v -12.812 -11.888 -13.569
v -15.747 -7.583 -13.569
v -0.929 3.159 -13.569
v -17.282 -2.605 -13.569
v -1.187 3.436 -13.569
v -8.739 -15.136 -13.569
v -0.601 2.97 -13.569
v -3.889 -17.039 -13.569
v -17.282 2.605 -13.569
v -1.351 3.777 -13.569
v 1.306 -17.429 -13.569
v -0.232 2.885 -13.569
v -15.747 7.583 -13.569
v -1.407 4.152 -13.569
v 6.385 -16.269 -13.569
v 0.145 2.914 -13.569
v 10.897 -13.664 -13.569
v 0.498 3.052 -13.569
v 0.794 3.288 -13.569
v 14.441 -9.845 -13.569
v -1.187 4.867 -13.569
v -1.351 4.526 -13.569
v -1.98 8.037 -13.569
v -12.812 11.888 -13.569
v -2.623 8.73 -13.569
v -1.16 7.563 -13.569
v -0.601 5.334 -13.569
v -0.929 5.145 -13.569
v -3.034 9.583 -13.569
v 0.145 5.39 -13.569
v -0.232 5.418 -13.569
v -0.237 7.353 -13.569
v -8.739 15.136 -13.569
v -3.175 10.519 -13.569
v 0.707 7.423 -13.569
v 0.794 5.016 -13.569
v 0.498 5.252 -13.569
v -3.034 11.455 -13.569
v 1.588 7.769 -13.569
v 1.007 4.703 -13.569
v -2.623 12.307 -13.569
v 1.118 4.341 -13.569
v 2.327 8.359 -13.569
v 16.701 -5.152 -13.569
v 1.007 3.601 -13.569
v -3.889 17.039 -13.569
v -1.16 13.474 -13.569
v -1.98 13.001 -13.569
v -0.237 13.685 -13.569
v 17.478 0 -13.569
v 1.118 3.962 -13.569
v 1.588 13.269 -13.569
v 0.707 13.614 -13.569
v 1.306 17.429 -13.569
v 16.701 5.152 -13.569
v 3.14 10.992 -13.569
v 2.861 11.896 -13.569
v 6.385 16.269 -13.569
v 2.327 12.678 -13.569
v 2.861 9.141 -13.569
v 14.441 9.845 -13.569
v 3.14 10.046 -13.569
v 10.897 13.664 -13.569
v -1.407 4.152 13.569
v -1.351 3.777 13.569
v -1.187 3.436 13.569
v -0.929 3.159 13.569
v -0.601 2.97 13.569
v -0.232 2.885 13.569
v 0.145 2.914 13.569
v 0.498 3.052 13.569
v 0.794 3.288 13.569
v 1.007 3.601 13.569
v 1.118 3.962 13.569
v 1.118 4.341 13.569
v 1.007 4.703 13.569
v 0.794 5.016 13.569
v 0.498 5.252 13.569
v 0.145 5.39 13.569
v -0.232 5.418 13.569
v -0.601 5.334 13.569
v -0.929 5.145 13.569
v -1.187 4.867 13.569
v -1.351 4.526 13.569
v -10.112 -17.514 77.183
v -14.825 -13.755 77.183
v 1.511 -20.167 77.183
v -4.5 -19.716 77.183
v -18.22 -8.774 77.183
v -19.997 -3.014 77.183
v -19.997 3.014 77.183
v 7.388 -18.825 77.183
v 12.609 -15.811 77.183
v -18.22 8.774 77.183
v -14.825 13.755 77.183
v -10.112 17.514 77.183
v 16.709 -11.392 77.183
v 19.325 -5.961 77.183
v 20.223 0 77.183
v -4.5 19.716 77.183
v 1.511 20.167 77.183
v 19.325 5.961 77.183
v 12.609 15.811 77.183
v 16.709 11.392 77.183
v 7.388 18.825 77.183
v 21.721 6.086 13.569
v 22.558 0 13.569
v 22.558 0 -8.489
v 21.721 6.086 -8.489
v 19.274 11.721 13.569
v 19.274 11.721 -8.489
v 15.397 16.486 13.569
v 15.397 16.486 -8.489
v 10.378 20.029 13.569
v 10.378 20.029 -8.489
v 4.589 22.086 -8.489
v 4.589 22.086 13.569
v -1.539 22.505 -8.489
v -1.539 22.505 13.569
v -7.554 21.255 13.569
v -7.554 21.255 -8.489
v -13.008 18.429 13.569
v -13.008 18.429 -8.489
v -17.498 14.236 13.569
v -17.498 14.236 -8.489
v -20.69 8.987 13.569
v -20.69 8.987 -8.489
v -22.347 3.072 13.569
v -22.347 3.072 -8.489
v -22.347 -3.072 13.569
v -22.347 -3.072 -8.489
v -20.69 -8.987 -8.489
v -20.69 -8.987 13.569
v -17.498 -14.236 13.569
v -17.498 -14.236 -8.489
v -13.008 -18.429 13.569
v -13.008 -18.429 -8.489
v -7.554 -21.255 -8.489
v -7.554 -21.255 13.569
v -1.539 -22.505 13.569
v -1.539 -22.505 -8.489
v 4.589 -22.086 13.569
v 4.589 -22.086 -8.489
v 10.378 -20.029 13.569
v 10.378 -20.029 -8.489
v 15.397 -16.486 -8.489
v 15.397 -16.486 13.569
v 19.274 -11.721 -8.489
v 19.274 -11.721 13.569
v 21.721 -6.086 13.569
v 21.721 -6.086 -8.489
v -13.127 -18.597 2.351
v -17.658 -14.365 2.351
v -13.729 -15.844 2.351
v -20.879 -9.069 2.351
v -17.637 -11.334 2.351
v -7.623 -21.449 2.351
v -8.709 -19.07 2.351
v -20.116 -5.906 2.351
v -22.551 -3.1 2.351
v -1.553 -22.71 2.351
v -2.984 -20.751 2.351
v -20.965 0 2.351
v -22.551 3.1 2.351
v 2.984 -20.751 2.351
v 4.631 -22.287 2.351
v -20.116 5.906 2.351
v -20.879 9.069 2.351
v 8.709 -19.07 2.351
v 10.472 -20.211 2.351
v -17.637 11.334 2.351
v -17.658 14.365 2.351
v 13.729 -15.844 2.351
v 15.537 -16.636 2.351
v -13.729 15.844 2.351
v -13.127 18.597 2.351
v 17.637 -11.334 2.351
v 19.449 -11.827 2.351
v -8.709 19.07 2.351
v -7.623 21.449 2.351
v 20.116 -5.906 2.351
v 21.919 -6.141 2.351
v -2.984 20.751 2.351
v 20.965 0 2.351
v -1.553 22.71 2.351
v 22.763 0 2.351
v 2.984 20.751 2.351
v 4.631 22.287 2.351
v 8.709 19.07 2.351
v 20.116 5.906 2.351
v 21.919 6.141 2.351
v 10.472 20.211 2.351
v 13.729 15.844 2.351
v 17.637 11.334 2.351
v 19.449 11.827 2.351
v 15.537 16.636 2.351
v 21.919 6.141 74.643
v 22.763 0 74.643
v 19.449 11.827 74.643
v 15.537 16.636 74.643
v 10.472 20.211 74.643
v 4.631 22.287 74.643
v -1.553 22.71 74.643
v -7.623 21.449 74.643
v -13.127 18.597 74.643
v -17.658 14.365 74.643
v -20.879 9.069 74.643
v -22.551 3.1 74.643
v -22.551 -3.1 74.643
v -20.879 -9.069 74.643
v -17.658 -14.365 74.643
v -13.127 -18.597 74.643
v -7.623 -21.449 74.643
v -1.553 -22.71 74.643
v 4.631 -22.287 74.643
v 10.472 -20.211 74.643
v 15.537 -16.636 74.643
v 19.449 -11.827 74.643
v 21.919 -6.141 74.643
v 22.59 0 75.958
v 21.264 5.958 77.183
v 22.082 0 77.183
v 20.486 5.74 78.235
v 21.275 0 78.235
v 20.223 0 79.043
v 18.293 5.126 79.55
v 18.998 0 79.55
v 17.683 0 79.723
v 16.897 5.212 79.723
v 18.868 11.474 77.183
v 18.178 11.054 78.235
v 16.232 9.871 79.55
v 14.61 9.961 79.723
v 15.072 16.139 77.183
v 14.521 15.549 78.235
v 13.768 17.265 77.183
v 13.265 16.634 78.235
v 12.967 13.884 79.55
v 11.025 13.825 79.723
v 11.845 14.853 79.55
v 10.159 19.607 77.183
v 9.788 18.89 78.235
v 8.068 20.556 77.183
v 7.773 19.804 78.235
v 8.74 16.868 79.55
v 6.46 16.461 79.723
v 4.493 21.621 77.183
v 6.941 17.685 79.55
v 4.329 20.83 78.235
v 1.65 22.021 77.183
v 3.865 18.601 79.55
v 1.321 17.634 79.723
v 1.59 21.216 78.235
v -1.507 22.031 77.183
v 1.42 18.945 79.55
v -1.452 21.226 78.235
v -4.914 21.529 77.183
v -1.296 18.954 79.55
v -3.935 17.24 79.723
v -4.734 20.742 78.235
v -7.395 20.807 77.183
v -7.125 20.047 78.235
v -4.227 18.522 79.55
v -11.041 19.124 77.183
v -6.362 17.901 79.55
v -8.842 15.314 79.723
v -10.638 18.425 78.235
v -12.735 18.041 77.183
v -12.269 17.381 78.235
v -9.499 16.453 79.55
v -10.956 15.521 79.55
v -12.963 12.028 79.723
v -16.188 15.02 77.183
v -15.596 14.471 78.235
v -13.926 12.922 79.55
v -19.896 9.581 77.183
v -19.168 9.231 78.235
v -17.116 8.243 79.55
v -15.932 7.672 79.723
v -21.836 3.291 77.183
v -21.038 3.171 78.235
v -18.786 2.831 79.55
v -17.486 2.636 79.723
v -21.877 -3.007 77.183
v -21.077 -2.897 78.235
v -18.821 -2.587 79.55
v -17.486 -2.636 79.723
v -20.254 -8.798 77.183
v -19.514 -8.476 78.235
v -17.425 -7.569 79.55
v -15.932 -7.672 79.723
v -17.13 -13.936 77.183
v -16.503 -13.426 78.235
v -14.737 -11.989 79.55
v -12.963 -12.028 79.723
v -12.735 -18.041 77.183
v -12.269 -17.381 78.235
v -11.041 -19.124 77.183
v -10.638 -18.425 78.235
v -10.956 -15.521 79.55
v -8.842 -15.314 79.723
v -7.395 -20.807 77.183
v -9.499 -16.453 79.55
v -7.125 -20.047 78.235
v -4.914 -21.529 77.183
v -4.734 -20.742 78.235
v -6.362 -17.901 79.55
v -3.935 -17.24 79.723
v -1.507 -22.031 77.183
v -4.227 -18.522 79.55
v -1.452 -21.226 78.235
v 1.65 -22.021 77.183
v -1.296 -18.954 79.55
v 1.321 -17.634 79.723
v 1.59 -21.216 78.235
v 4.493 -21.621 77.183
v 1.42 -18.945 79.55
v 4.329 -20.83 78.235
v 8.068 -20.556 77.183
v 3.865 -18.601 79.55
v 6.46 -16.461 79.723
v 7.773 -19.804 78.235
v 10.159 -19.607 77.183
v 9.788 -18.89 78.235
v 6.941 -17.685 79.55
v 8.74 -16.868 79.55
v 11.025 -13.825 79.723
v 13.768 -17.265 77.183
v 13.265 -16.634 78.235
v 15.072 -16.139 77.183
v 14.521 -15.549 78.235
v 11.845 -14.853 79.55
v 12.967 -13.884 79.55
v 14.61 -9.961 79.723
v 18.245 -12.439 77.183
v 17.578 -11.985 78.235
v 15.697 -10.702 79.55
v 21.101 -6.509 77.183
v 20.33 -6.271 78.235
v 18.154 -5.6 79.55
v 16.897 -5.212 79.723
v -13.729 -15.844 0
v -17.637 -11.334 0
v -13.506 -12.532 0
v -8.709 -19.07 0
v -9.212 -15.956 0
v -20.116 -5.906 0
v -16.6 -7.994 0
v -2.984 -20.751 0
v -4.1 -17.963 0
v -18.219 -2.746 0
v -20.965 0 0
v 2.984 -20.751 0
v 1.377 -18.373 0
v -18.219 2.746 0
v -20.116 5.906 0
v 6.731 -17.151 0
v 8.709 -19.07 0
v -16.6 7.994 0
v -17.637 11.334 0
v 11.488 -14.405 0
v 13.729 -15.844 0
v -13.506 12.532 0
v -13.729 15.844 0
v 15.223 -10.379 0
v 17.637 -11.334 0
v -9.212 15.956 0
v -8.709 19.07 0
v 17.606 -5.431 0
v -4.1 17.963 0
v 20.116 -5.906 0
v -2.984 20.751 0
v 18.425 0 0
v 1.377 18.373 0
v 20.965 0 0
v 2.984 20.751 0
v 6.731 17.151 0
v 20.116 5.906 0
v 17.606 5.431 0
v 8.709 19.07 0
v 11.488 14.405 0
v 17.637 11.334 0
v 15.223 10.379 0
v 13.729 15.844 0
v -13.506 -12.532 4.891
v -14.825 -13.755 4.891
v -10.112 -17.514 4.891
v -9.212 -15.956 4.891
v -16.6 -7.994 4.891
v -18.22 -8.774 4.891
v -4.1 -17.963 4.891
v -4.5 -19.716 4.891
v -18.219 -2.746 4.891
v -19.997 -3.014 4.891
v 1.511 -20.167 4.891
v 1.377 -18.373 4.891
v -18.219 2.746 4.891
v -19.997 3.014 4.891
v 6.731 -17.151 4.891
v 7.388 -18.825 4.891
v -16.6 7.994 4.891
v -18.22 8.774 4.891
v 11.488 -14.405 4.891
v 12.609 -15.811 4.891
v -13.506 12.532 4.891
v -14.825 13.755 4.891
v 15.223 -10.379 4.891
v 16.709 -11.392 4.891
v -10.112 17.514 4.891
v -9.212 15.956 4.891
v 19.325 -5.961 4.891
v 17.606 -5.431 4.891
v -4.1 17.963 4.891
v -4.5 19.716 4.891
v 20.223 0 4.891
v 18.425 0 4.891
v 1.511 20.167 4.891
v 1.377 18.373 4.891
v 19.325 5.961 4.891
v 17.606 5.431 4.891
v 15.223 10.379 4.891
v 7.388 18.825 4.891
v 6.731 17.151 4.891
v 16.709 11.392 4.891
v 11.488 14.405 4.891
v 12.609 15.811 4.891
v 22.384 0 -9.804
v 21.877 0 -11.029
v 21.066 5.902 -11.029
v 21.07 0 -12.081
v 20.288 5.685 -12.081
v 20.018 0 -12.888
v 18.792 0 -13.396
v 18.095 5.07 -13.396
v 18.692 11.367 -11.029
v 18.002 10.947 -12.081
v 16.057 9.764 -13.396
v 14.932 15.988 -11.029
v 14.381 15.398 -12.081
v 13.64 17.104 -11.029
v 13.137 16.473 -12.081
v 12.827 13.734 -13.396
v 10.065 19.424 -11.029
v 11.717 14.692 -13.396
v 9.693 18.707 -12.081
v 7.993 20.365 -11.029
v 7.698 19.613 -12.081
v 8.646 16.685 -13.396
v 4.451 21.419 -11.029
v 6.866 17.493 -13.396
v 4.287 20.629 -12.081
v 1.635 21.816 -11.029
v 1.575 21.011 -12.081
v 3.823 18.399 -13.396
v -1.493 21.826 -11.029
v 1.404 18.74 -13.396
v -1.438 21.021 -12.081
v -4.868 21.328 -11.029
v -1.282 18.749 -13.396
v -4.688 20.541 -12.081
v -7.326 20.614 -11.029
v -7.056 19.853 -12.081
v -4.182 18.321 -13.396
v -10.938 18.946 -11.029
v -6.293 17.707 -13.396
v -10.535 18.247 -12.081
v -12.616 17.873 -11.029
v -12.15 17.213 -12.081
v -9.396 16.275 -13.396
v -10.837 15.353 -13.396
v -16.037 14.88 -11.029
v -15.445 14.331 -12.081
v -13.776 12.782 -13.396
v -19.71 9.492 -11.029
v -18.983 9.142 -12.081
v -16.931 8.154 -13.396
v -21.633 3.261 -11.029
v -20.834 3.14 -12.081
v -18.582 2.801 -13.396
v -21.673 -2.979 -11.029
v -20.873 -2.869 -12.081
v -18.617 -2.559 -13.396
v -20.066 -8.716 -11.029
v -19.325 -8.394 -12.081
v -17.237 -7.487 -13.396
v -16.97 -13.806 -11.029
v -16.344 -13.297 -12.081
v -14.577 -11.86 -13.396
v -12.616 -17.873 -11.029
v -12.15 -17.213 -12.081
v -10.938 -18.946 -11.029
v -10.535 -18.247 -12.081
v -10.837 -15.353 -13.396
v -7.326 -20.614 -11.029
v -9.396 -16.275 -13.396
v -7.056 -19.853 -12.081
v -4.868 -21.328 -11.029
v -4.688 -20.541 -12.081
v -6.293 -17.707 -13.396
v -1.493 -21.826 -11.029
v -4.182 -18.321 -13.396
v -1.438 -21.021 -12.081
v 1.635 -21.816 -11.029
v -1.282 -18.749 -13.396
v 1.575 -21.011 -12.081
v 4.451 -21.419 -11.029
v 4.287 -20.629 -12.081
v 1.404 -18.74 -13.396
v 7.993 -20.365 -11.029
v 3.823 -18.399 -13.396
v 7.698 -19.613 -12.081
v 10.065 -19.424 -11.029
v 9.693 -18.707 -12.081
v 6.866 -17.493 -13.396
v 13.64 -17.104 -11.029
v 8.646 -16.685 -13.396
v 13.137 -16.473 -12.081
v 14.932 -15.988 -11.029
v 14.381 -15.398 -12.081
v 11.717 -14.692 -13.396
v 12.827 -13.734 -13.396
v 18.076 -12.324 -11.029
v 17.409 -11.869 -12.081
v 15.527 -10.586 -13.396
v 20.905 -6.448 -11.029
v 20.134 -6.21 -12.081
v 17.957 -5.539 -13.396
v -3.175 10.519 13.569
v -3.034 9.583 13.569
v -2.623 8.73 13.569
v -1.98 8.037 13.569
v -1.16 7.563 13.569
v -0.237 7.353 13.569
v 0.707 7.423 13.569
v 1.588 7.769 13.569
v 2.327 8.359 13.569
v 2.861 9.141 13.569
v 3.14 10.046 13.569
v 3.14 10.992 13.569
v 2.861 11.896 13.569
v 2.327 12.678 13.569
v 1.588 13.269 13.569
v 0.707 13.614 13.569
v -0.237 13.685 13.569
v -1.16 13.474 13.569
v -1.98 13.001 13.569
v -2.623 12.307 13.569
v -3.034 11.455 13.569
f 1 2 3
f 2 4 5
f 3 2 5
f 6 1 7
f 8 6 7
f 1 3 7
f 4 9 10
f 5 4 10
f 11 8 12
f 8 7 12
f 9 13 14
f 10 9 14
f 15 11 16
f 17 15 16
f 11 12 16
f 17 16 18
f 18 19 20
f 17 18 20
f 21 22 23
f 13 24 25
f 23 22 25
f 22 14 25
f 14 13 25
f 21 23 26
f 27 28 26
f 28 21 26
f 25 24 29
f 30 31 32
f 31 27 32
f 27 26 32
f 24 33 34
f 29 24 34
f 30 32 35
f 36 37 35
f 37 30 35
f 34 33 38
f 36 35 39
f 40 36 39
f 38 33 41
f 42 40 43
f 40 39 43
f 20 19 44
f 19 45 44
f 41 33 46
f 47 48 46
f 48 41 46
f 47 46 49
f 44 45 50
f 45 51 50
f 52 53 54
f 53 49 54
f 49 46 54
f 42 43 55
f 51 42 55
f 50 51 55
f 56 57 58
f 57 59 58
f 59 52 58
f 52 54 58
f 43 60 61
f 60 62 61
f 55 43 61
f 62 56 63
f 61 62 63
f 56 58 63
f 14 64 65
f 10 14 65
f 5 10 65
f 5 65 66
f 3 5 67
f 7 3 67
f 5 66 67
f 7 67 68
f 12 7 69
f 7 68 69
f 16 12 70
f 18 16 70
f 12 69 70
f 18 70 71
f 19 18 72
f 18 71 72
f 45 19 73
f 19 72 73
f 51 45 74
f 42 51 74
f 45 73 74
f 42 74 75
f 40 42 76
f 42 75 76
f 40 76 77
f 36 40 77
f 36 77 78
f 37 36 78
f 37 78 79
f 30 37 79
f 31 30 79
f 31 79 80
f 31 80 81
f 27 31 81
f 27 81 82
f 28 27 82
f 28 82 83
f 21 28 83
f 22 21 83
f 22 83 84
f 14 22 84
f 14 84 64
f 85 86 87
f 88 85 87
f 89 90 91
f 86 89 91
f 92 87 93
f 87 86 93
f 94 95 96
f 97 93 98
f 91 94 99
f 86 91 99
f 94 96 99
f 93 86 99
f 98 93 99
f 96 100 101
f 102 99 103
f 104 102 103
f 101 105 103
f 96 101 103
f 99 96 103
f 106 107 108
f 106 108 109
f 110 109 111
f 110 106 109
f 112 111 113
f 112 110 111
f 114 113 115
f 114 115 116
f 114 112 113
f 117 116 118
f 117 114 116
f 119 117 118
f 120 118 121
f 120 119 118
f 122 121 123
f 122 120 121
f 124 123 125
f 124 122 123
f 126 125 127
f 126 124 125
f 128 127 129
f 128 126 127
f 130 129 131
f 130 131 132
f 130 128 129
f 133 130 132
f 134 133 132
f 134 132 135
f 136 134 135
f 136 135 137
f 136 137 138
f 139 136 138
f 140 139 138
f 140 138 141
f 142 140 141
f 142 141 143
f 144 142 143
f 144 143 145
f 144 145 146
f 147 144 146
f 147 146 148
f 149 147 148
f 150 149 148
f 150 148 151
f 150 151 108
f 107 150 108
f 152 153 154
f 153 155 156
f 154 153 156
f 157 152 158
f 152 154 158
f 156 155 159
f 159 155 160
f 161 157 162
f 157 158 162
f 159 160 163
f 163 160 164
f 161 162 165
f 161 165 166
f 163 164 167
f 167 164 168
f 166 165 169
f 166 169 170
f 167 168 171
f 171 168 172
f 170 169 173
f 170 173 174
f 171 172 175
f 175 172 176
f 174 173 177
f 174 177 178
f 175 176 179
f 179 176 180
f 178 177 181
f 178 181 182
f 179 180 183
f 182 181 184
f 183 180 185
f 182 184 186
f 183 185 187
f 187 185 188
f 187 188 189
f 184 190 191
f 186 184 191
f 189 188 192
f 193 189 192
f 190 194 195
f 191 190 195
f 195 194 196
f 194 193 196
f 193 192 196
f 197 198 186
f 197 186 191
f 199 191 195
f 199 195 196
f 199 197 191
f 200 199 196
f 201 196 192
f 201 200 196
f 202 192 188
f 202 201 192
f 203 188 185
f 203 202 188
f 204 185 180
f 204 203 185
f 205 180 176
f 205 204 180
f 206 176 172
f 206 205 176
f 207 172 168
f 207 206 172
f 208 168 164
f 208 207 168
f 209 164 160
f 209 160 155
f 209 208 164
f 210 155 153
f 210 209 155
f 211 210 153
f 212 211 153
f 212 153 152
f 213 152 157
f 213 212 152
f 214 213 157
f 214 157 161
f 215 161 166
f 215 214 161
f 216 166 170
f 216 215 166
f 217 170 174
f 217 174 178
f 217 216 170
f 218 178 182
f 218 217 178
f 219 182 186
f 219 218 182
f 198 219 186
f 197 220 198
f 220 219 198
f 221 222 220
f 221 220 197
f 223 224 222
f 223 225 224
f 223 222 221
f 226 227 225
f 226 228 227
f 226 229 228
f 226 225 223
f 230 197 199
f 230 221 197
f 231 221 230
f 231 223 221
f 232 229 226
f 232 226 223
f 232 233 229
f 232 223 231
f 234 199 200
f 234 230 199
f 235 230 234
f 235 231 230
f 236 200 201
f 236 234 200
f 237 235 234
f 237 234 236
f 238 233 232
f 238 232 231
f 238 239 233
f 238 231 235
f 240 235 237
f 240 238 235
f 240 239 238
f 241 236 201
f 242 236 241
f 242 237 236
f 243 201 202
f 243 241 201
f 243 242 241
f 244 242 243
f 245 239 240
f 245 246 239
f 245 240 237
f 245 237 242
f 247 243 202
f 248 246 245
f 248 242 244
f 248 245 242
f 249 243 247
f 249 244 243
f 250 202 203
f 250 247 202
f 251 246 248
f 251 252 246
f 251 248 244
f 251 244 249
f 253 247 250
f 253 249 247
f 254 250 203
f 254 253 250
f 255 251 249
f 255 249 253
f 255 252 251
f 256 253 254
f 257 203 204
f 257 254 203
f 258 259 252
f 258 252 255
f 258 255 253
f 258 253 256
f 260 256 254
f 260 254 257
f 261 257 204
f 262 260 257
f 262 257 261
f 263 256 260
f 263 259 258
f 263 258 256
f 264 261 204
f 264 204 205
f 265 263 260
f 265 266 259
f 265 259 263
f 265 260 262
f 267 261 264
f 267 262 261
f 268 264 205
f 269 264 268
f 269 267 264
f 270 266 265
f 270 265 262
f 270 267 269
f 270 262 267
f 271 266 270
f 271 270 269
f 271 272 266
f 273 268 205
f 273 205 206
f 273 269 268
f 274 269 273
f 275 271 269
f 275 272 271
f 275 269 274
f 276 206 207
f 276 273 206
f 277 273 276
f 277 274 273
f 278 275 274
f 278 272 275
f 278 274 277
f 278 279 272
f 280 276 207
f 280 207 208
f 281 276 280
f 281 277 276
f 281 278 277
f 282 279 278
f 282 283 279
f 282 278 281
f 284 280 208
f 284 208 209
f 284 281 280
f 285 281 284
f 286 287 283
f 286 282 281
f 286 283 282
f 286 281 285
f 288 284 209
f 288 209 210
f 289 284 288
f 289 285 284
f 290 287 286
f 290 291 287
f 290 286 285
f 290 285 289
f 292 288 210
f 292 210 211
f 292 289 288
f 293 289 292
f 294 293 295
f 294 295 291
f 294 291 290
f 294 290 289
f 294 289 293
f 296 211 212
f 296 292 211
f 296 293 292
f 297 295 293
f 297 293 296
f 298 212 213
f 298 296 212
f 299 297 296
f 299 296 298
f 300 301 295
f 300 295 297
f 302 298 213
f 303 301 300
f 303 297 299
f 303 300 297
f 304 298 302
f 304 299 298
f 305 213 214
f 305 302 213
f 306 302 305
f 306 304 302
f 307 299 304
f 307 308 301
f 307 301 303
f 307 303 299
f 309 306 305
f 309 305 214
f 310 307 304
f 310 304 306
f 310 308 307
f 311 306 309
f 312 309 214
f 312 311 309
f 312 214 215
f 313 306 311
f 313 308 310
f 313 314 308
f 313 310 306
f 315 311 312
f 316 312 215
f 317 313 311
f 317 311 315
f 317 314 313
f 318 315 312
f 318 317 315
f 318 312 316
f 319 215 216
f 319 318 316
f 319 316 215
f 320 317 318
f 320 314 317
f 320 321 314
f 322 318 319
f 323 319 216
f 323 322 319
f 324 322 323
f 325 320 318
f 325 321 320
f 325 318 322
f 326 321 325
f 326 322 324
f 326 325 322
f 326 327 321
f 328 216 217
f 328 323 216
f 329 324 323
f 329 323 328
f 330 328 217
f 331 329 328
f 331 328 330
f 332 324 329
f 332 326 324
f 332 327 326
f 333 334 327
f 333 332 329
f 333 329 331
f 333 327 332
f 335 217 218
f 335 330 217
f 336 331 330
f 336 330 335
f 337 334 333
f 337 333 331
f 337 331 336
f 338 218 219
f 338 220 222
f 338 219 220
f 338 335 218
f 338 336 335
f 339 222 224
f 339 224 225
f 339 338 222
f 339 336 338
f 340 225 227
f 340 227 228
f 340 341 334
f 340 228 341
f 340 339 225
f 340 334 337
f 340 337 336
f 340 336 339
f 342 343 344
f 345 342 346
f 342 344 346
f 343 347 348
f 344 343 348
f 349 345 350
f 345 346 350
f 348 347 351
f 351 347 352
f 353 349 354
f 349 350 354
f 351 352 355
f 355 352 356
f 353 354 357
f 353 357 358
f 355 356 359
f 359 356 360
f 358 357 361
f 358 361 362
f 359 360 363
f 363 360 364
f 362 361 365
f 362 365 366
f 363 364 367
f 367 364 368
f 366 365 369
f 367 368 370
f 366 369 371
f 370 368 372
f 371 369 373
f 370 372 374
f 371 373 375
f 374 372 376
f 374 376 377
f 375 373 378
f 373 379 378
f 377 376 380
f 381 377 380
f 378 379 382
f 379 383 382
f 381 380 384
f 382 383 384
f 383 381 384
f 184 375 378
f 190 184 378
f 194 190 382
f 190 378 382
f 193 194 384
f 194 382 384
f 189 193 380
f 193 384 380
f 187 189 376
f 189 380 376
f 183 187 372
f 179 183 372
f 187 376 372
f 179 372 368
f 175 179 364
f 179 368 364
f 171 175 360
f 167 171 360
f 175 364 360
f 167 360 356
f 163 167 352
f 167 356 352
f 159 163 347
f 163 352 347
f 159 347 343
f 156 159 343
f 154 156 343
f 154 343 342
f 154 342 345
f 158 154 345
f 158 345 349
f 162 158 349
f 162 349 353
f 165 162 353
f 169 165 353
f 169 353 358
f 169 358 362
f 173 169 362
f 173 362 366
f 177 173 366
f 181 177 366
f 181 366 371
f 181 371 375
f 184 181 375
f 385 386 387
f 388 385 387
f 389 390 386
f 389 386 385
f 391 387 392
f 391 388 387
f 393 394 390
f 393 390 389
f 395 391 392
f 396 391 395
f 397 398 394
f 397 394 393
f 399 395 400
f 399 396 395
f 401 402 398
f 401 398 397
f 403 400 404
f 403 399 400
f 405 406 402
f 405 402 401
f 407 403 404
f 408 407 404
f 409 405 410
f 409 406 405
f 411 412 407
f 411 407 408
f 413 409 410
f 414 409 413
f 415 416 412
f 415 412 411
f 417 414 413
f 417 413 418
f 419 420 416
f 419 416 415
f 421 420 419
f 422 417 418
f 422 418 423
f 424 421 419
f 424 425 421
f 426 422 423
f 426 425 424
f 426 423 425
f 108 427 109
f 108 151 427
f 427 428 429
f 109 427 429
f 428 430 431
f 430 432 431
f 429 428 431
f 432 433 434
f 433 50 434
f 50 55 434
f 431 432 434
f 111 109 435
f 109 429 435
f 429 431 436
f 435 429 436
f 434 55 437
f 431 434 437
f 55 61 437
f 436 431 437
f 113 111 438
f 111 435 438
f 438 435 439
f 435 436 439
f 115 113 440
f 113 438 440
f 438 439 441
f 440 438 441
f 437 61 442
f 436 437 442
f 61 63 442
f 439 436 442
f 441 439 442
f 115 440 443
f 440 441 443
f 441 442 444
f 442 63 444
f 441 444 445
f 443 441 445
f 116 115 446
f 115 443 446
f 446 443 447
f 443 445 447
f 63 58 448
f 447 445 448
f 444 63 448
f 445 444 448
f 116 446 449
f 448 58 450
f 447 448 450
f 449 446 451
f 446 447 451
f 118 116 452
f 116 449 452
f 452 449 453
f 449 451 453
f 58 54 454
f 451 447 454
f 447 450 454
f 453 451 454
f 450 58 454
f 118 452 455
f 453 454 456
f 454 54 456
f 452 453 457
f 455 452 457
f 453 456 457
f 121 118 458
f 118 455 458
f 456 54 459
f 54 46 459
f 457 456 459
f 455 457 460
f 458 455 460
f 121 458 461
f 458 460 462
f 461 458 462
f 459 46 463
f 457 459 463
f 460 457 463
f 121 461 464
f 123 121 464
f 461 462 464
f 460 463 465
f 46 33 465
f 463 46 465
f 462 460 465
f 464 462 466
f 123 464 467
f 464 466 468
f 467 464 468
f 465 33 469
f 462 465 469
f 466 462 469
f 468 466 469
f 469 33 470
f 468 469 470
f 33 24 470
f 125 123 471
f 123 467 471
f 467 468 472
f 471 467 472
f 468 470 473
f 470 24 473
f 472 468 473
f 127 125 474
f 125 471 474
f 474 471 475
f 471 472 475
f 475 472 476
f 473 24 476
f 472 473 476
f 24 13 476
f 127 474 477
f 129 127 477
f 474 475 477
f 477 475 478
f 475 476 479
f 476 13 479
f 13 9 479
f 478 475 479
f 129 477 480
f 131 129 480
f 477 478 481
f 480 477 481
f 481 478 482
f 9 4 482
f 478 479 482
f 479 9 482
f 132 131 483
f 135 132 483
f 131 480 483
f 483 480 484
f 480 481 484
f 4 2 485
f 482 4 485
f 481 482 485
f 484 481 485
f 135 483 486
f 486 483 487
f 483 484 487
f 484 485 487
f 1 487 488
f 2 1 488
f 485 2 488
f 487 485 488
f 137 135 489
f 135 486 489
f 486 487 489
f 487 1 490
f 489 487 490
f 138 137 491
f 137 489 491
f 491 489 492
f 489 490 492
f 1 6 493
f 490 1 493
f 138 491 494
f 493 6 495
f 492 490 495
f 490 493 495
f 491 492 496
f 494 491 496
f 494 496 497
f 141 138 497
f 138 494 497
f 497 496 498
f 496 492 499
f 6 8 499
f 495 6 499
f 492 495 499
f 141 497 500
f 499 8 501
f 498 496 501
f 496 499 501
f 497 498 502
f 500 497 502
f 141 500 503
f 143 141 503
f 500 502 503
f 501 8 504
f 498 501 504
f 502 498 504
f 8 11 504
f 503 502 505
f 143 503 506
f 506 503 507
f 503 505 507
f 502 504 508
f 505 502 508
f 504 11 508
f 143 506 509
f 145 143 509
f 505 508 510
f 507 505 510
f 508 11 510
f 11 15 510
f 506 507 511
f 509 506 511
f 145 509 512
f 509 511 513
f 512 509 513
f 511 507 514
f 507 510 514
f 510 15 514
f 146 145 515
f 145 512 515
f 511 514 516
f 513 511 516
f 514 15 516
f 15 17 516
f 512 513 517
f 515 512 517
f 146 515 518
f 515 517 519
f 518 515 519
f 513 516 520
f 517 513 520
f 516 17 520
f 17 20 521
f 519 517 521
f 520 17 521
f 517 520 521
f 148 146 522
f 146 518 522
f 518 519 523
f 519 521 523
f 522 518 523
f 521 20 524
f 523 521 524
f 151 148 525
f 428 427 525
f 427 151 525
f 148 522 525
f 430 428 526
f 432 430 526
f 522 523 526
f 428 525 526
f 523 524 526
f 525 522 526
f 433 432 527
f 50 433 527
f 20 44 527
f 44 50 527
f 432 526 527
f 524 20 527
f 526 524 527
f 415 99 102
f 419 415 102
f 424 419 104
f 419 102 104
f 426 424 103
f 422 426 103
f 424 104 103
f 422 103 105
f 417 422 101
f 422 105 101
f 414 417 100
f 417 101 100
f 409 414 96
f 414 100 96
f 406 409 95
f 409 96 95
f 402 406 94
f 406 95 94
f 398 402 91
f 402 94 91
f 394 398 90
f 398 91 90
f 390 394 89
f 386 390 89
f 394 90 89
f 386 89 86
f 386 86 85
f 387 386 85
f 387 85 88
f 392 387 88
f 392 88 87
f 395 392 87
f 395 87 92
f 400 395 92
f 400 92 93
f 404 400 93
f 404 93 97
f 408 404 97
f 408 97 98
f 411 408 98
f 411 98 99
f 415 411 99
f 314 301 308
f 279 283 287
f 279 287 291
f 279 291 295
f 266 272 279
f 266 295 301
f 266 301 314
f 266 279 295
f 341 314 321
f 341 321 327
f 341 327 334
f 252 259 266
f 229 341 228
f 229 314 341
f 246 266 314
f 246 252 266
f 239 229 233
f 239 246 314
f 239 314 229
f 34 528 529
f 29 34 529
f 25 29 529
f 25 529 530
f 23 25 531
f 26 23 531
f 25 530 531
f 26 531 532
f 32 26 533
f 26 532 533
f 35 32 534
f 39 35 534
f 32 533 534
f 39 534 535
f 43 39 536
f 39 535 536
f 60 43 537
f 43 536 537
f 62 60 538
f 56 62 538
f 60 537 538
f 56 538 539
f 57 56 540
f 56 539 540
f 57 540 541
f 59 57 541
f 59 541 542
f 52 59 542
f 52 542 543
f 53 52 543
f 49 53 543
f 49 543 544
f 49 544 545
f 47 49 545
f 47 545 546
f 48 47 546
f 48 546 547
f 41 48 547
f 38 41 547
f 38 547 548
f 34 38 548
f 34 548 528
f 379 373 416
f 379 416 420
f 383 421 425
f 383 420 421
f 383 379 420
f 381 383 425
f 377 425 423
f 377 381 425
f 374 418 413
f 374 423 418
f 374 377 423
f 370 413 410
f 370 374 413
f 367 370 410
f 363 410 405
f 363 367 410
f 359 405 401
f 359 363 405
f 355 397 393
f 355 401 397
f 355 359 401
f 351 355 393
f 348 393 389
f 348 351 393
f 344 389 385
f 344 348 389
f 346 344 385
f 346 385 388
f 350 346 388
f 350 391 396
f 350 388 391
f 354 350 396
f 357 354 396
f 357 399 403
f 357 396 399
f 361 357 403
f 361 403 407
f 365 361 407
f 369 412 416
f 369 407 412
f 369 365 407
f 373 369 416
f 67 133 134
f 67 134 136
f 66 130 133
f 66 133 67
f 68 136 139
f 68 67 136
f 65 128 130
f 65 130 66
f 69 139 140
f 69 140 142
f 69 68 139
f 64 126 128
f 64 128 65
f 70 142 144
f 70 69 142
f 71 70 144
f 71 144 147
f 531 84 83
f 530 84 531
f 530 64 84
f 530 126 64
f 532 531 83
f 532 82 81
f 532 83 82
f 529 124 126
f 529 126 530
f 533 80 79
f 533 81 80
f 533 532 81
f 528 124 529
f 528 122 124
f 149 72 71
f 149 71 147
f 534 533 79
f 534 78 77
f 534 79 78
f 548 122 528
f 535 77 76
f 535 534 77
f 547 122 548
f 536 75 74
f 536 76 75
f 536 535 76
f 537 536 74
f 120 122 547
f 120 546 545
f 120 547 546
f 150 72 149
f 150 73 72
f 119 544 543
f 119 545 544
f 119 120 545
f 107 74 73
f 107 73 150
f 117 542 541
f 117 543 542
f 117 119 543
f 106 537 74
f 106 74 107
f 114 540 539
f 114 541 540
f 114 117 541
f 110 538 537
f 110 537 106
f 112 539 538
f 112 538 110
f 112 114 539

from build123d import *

# Parameters (mm, degrees)
F0_R      = 20.9647391965
F1_DEPTH  = 79.7232091427
F2_R      = 22.7630616111
F2_R_2    = 20.9647391965
F3_DEPTH  = 77.3724243045
F4_T      = -2.54
F5_R      = 5.08
F6_R      = 22.5575417357
F7_DEPTH  = 13.5688632727
F9_D      = 6.35
F9_DEPTH  = 31.75
F9_TIP    = 1.9077324654
F10_R     = 5.08
F12_D     = 2.54
F12_DEPTH = 31.75
F12_TIP   = 0.7630929862


with BuildPart() as f1:
    # F0 (on Top) → F1 (new body)
    with BuildSketch(Plane.XY):
        Circle(F0_R)
    extrude(amount=F1_DEPTH)

    # F2 (on face) → F3 (join)
    with BuildSketch(Plane.XY.offset(79.7232091427)):
        Circle(F2_R)
        Circle(F2_R_2, mode=Mode.SUBTRACT)
    extrude(amount=-F3_DEPTH)

    # F4
    f4_openings = [f1.faces().sort_by_distance(p)[0] for p in [
        (0, 0, 0),
    ]]
    offset(amount=F4_T, openings=f4_openings, kind=Kind.INTERSECTION)

    # F5
    f5_edges = [f1.edges().sort_by_distance(p)[0] for p in [
        (-22.763062, 0, 79.723209),
    ]]
    fillet(f5_edges, radius=F5_R)


with BuildPart() as f7:
    # F6 (on Top) → F7 (new body, symmetric)
    with BuildSketch(Plane.XY):
        Circle(F6_R)
    extrude(amount=F7_DEPTH, both=True)

    # F9
    with Locations(Plane(origin=(0, 0, -13.5688632727), x_dir=(1, 0, 0), z_dir=(0, 0, -1))):
        with Locations((0, -10.5188945308)):
            Hole(F9_D / 2, depth=F9_DEPTH)
            with Locations((0, 0, -(F9_DEPTH + F9_TIP / 2))):  # 118° drill point
                Cone(0, F9_D / 2, F9_TIP, mode=Mode.SUBTRACT)

    # F10
    f10_edges = [f7.edges().sort_by_distance(p)[0] for p in [
        (-22.557542, 0, -13.568863),
    ]]
    fillet(f10_edges, radius=F10_R)

    # F12
    with Locations(Plane(origin=(0, 0, -13.5688632727), x_dir=(1, 0, 0), z_dir=(0, 0, -1))):
        with Locations((-0.1373706036, -4.1517633945)):
            Hole(F12_D / 2, depth=F12_DEPTH)
            with Locations((0, 0, -(F12_DEPTH + F12_TIP / 2))):  # 118° drill point
                Cone(0, F12_D / 2, F12_TIP, mode=Mode.SUBTRACT)


solid = Compound([f1.part, f7.part])
